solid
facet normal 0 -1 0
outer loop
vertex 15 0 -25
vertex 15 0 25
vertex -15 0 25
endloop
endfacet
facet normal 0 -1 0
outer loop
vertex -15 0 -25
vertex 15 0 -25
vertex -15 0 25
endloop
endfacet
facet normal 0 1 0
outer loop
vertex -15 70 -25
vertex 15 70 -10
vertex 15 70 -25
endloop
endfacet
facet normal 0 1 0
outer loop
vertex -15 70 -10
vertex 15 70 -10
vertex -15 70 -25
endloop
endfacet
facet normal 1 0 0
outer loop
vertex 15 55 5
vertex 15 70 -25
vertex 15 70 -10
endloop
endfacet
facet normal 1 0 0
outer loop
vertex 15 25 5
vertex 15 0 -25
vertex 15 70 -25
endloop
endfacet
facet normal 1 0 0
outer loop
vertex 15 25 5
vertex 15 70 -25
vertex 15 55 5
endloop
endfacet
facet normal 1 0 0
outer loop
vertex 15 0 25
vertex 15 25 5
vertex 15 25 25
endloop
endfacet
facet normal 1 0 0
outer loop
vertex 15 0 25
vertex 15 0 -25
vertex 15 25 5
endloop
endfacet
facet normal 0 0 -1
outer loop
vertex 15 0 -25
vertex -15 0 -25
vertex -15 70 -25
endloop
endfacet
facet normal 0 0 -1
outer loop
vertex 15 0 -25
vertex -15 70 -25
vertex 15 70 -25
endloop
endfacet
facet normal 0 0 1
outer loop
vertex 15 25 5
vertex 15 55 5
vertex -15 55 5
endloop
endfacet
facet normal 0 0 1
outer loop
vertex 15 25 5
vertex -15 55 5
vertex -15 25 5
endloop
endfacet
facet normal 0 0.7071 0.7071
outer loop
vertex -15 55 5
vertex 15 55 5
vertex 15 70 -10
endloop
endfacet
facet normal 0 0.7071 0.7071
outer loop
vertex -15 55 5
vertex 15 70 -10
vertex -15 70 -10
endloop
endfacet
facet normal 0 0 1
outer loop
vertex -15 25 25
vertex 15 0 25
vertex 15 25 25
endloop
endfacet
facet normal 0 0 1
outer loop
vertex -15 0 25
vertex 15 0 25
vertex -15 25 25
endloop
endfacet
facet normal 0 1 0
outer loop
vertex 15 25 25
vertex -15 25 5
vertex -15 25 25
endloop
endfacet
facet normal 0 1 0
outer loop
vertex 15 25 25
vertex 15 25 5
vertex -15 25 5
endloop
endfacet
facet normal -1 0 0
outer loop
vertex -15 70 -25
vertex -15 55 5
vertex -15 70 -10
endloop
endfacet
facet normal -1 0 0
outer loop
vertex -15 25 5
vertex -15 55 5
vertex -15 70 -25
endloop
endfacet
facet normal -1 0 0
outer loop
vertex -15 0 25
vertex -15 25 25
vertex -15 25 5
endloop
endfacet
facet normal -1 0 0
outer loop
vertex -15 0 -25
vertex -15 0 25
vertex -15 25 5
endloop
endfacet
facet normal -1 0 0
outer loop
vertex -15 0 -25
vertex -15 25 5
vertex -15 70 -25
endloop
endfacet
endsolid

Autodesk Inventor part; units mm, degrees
ref_plane "YZ Plane" through (0, 0, 0) normal (1, 0, 0) x (0, 1, 0)
ref_plane "XZ Plane" through (0, 0, 0) normal (0, 1, 0) x (-1, 0, 0)
ref_plane "XY Plane" through (0, 0, 0) normal (0, 0, 1) x (1, 0, 0)
sketch "Esboço1" plane through (0, 0, 0) normal (0, 1, 0) x (-1, 0, 0)
  line L0 (-15, 25) -> (15, 25)
  line L1 (15, 25) -> (15, -25)
  line L2 (15, -25) -> (-15, -25)
  line L3 (-15, -25) -> (-15, 25)
  line L4 (-15, 25) -> (15, -25) construction
  line L5 (15, 25) -> (-15, -25) construction
  point P0 (0, 0)
  dimension "d0" = 30
  dimension "d1" = 50
extrude "Extrusão1" add sketch "Esboço1" along normal blind 70
sketch "Esboço2" plane through (15, 0, 25) normal (1, 0, 0) x (0, 0, -1)
  point P0 (25, 0)
sketch "Esboço3" plane through (15, 0, 25) normal (1, 0, 0) x (0, 0, -1)
  point P0 (25, 0)
sketch "Esboço4" plane through (15, 0, 25) normal (1, 0, 0) x (0, 0, -1)
  line L0 (0, 70) -> (20, 70)
  line L1 (20, 70) -> (20, 25)
  line L2 (20, 25) -> (0, 25)
  line L3 (0, 25) -> (0, 70)
  line L4 (50, 0) -> (50, 70) projected
  line L5 (0, 0) -> (50, 0) projected
  point P0 (25, 0)
  dimension "d4" = 30
  dimension "d5" = 25
extrude "Extrusão2" cut sketch "Esboço4" against normal blind 30
sketch "Esboço5" plane through (15, 0, 25) normal (1, 0, 0) x (0, 0, -1)
  point P0 (25, 0)
chamfer "Chanfro1" distance 15 angle 45 1 edges at (0, 70, 5) measured on face at (5, 70, -5)
